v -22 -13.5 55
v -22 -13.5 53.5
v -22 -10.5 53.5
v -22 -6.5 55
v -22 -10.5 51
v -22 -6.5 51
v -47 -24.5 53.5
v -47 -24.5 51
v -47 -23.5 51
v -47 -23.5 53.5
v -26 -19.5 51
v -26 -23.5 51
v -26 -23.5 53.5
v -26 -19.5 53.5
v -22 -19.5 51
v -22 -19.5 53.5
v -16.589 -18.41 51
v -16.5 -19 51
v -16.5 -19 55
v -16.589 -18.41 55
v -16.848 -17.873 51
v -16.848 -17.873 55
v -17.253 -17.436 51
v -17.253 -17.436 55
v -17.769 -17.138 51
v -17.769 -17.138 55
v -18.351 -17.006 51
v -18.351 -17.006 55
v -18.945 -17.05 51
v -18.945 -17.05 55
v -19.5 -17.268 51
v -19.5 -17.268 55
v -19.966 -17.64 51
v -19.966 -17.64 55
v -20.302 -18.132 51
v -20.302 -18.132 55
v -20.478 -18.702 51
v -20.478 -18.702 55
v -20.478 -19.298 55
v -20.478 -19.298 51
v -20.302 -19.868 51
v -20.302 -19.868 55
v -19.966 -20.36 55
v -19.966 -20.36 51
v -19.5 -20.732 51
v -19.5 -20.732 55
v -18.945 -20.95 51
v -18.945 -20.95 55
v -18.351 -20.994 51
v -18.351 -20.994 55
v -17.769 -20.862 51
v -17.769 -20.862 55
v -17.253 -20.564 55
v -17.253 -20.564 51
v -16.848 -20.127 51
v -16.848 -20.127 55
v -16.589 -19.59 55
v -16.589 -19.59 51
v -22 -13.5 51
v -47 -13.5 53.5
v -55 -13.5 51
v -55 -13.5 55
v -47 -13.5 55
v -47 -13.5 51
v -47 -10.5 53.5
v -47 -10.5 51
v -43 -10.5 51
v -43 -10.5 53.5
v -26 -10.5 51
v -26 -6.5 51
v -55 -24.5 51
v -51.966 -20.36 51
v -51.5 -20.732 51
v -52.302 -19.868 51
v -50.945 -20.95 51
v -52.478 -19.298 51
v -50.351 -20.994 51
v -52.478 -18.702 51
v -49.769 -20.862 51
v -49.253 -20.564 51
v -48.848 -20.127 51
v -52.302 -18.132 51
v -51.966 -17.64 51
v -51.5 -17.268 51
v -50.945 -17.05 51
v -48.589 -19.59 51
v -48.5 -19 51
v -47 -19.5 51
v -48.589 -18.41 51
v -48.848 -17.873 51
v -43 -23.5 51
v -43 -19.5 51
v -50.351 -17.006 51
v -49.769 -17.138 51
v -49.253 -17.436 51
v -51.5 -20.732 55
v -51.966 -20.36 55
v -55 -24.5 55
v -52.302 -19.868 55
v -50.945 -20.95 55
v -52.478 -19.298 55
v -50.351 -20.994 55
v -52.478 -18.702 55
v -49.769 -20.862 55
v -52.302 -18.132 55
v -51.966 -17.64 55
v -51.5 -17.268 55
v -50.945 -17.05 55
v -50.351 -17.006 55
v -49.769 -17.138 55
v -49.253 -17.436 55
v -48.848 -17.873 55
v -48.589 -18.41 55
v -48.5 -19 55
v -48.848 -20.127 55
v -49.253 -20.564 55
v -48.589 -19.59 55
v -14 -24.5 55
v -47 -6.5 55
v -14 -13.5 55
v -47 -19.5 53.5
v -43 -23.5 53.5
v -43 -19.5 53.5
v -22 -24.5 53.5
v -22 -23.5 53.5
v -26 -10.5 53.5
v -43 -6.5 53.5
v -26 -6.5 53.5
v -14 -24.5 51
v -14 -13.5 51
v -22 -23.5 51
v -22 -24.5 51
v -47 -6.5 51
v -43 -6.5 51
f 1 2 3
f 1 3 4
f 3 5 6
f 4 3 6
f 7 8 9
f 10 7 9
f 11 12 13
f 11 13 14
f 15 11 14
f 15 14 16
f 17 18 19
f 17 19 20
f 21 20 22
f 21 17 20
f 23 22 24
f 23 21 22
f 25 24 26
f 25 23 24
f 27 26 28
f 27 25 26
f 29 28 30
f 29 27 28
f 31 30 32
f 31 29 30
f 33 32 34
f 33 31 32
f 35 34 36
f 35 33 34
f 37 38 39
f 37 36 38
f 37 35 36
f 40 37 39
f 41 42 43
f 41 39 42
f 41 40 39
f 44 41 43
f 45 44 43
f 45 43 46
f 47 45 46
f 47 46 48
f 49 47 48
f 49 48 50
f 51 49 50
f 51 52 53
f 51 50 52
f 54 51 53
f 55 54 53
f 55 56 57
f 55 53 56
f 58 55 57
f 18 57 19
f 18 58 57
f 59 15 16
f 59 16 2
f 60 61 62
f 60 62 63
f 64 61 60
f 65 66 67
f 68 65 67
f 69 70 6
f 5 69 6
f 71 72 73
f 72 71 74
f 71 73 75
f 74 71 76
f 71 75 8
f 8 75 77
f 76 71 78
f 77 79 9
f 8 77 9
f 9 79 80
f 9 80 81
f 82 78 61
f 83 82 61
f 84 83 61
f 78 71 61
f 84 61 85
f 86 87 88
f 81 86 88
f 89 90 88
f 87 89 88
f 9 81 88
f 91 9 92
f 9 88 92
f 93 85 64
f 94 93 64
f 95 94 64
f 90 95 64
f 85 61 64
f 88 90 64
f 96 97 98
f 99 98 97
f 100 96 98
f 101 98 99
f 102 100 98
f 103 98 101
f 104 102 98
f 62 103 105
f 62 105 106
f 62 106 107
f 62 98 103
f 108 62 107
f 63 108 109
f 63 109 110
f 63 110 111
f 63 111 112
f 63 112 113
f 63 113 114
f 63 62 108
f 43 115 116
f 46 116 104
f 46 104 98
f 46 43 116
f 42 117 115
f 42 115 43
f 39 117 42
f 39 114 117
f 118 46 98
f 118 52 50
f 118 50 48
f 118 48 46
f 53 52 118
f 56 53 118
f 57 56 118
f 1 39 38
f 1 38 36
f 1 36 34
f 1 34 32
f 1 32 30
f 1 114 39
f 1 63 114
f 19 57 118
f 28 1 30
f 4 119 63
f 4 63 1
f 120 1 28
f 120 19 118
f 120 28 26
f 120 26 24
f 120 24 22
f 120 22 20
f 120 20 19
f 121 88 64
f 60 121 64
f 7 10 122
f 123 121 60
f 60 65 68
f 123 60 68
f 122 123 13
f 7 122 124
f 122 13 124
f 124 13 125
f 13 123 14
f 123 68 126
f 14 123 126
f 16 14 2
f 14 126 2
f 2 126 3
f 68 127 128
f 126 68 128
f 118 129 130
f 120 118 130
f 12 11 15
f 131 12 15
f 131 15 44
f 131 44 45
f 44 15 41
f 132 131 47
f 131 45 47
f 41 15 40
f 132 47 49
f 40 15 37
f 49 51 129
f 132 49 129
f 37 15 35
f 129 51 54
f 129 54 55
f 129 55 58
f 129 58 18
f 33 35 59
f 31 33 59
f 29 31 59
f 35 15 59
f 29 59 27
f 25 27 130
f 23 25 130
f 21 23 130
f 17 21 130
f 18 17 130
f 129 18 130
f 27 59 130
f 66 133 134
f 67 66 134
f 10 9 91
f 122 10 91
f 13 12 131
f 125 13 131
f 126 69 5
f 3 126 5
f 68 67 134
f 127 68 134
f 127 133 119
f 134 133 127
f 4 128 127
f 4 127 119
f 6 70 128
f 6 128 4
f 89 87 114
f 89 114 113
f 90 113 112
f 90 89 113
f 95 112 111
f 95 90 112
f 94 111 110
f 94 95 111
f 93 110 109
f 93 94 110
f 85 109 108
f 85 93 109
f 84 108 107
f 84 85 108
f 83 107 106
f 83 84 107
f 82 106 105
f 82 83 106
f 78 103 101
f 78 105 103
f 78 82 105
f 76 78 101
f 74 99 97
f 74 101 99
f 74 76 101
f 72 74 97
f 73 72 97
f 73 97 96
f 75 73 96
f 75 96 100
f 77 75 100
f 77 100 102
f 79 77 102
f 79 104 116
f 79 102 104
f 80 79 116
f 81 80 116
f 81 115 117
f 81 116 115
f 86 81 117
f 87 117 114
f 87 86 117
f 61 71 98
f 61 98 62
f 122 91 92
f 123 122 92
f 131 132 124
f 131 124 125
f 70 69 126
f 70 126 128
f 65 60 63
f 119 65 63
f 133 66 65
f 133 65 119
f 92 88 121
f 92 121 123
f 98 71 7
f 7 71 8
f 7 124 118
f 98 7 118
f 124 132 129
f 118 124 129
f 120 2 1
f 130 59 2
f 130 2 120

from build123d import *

# Parameters (mm, degrees)
CYLINDER397_R     = 2
CYLINDER397_DEPTH = 13
CYLINDER396_R     = 2
CYLINDER396_DEPTH = 13
BOX478_W          = 4
BOX478_H          = 4
BOX478_DEPTH      = 4
BOX486_W          = 25
BOX486_H          = 18
BOX486_DEPTH      = 1.5
BOX483_W          = 4
BOX483_H          = 4
BOX483_DEPTH      = 4
BOX485_W          = 4
BOX485_H          = 4
BOX485_DEPTH      = 4
BOX484_W          = 4
BOX484_H          = 4
BOX484_DEPTH      = 4
BOX504_W          = 8
BOX504_H          = 11
BOX504_DEPTH      = 4
BOX505_W          = 8
BOX505_H          = 11
BOX505_DEPTH      = 4


with BuildPart() as cylinder397:
    # Cylinder397 → Cylinder397 (new body)
    with BuildSketch(Plane(origin=(-48, -69, -5), x_dir=(1, 0, 0), z_dir=(0, 0, 1))):
        Circle(CYLINDER397_R)
    extrude(amount=CYLINDER397_DEPTH)


with BuildPart() as fusion394:
    # Cylinder396 → Cylinder396 (new body)
    with BuildSketch(Plane(origin=(-16, -69, -5), x_dir=(1, 0, 0), z_dir=(0, 0, 1))):
        Circle(CYLINDER396_R)
    extrude(amount=CYLINDER396_DEPTH)

    # Fusion394: union Cylinder397
    add(cylinder397.part)


with BuildPart() as fusion394_1:
    # Fusion394 placement: moved
    add(fusion394.part.moved(Location((-2.5, 50, 51))))


with BuildPart() as box478:
    # Box478 → Box478 (new body)
    with BuildSketch(Plane(origin=(-26, -10.5, 51), x_dir=(1, 0, 0), z_dir=(0, 0, 1))):
        with Locations((2, 2)):
            Rectangle(BOX478_W, BOX478_H)
    extrude(amount=BOX478_DEPTH)


with BuildPart() as box486:
    # Box486 → Box486 (new body)
    with BuildSketch(Plane(origin=(-47, -24.5, 53.5), x_dir=(1, 0, 0), z_dir=(0, 0, 1))):
        with Locations((12.5, 9)):
            Rectangle(BOX486_W, BOX486_H)
    extrude(amount=BOX486_DEPTH)


with BuildPart() as box483:
    # Box483 → Box483 (new body)
    with BuildSketch(Plane(origin=(-26, -23.5, 51), x_dir=(1, 0, 0), z_dir=(0, 0, 1))):
        with Locations((2, 2)):
            Rectangle(BOX483_W, BOX483_H)
    extrude(amount=BOX483_DEPTH)


with BuildPart() as box485:
    # Box485 → Box485 (new body)
    with BuildSketch(Plane(origin=(-47, -23.5, 51), x_dir=(1, 0, 0), z_dir=(0, 0, 1))):
        with Locations((2, 2)):
            Rectangle(BOX485_W, BOX485_H)
    extrude(amount=BOX485_DEPTH)


with BuildPart() as box484:
    # Box484 → Box484 (new body)
    with BuildSketch(Plane(origin=(-47, -10.5, 51), x_dir=(1, 0, 0), z_dir=(0, 0, 1))):
        with Locations((2, 2)):
            Rectangle(BOX484_W, BOX484_H)
    extrude(amount=BOX484_DEPTH)


with BuildPart() as box504:
    # Box504 → Box504 (new body)
    with BuildSketch(Plane(origin=(-55, -24.5, 51), x_dir=(1, 0, 0), z_dir=(0, 0, 1))):
        with Locations((4, 5.5)):
            Rectangle(BOX504_W, BOX504_H)
    extrude(amount=BOX504_DEPTH)


with BuildPart() as cut425:
    # Box505 → Box505 (new body)
    with BuildSketch(Plane(origin=(-22, -24.5, 51), x_dir=(1, 0, 0), z_dir=(0, 0, 1))):
        with Locations((4, 5.5)):
            Rectangle(BOX505_W, BOX505_H)
    extrude(amount=BOX505_DEPTH)

    # Fusion395: union Box478, Box486, Box483, Box485, Box484, Box504
    add(box478.part)
    add(box486.part)
    add(box483.part)
    add(box485.part)
    add(box484.part)
    add(box504.part)

    # Cut425: cut Fusion394
    add(fusion394_1.part, mode=Mode.SUBTRACT)


solid = cut425.part
